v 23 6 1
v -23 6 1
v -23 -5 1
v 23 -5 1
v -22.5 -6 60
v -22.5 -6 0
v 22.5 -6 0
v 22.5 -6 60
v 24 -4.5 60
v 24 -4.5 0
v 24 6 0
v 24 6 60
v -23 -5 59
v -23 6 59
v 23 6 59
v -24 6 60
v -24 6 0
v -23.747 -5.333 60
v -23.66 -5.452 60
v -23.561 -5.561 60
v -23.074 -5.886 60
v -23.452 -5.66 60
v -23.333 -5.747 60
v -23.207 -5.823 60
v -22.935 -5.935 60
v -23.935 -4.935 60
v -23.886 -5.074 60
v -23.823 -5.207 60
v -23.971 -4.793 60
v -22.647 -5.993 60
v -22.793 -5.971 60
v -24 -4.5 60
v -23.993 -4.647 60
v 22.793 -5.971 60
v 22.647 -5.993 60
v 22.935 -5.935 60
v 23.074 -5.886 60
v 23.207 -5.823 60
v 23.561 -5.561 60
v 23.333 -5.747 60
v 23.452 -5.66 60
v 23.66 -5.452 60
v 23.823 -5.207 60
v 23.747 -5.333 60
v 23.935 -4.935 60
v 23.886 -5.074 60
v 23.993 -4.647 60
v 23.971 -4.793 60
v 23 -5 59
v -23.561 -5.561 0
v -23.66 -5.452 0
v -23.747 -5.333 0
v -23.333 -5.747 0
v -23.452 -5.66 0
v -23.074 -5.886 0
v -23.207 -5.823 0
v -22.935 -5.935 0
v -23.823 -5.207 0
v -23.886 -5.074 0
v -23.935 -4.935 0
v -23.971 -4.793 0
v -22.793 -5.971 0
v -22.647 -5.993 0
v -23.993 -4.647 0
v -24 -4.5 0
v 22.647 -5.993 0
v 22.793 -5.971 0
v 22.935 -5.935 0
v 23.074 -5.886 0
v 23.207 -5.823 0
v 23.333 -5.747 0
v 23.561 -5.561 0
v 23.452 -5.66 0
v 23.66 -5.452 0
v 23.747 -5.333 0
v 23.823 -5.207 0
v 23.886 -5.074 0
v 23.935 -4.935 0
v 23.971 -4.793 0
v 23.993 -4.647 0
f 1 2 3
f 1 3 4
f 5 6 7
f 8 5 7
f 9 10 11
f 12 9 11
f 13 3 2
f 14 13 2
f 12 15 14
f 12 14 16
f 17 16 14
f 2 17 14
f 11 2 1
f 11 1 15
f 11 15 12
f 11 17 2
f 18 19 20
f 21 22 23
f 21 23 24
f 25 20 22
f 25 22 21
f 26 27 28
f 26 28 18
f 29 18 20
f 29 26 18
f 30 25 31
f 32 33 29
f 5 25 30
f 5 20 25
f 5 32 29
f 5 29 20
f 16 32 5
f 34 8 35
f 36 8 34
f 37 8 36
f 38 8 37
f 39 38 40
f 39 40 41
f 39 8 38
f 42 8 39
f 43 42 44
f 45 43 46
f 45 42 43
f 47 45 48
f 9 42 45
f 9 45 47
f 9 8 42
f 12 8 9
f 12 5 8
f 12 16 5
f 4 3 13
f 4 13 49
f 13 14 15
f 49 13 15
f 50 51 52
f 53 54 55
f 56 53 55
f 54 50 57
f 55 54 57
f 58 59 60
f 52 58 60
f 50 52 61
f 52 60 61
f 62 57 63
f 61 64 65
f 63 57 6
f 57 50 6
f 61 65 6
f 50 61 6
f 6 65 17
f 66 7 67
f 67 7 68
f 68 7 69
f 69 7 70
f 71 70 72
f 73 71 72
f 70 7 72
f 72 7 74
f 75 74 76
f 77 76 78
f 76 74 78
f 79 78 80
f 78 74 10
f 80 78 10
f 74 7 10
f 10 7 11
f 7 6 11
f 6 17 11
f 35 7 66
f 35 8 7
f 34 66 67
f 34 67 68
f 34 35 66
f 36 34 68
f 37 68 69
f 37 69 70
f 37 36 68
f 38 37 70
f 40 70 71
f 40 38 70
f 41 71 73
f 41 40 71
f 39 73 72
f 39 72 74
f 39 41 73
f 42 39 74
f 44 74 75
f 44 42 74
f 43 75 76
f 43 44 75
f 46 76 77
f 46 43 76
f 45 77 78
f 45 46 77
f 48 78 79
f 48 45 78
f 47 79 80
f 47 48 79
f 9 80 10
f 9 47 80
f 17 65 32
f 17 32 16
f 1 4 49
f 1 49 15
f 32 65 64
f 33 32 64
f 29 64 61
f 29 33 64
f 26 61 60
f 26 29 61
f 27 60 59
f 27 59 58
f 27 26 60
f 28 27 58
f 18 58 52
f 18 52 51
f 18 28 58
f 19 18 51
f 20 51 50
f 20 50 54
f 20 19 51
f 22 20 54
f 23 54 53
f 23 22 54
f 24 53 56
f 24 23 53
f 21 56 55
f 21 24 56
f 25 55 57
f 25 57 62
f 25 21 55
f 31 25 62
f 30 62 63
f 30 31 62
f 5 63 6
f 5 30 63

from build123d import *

# Parameters (mm, degrees)
F0_W     = 48
F0_H     = 12
F1_DEPTH = 60
F2_T     = -1
F3_R     = 1.5


with BuildPart() as f1:
    # F0 (on Top) → F1 (new body)
    with BuildSketch(Plane.XY):
        Rectangle(F0_W, F0_H)
    extrude(amount=F1_DEPTH)

    # F2
    f2_openings = [f1.faces().sort_by_distance(p)[0] for p in [
        (0, 6, 30),
    ]]
    offset(amount=F2_T, openings=f2_openings)

    # F3
    f3_edges = [f1.edges().sort_by_distance(p)[0] for p in [
        (24, -6, 30),
        (-24, -6, 30),
    ]]
    fillet(f3_edges, radius=F3_R)


solid = f1.part
